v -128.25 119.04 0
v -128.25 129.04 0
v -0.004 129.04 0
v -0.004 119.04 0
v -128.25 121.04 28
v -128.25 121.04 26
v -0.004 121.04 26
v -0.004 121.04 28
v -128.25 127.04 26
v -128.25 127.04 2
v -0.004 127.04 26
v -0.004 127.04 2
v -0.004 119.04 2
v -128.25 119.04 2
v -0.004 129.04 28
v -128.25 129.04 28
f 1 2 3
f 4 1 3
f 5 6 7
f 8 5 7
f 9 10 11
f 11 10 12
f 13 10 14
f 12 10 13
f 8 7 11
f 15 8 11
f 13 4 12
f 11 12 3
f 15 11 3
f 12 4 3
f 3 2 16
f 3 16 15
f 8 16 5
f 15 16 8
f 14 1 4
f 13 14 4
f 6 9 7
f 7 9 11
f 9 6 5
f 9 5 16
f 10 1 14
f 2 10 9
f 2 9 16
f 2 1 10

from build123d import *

# Parameters (mm, degrees)
ESQUISSE1_W        = 128.24605794
ESQUISSE1_H        = 10
BOSS_EXTRU_2_DEPTH = 2
ESQUISSE2_W        = 128.24605794
ESQUISSE2_H        = 2
BOSS_EXTRU_3_DEPTH = 24
ESQUISSE3_W        = 128.24605794
ESQUISSE3_H        = 8
BOSS_EXTRU_4_DEPTH = 2


with BuildPart() as part:
    # Esquisse1 → Boss.-Extru.2 (new body)
    with BuildSketch(Plane.XY):
        with Locations((-64.12703781, 124.040016289)):
            Rectangle(ESQUISSE1_W, ESQUISSE1_H)
    extrude(amount=BOSS_EXTRU_2_DEPTH)

    # Esquisse2 → Boss.-Extru.3 (add)
    with BuildSketch(Plane.XY.offset(2)):
        with Locations((-64.12703781, 128.040016289)):
            Rectangle(ESQUISSE2_W, ESQUISSE2_H)
    extrude(amount=BOSS_EXTRU_3_DEPTH)

    # Esquisse3 → Boss.-Extru.4 (add)
    with BuildSketch(Plane.XY.offset(26)):
        with Locations((-64.12703781, 125.040016289)):
            Rectangle(ESQUISSE3_W, ESQUISSE3_H)
    extrude(amount=BOSS_EXTRU_4_DEPTH)


solid = part.part
